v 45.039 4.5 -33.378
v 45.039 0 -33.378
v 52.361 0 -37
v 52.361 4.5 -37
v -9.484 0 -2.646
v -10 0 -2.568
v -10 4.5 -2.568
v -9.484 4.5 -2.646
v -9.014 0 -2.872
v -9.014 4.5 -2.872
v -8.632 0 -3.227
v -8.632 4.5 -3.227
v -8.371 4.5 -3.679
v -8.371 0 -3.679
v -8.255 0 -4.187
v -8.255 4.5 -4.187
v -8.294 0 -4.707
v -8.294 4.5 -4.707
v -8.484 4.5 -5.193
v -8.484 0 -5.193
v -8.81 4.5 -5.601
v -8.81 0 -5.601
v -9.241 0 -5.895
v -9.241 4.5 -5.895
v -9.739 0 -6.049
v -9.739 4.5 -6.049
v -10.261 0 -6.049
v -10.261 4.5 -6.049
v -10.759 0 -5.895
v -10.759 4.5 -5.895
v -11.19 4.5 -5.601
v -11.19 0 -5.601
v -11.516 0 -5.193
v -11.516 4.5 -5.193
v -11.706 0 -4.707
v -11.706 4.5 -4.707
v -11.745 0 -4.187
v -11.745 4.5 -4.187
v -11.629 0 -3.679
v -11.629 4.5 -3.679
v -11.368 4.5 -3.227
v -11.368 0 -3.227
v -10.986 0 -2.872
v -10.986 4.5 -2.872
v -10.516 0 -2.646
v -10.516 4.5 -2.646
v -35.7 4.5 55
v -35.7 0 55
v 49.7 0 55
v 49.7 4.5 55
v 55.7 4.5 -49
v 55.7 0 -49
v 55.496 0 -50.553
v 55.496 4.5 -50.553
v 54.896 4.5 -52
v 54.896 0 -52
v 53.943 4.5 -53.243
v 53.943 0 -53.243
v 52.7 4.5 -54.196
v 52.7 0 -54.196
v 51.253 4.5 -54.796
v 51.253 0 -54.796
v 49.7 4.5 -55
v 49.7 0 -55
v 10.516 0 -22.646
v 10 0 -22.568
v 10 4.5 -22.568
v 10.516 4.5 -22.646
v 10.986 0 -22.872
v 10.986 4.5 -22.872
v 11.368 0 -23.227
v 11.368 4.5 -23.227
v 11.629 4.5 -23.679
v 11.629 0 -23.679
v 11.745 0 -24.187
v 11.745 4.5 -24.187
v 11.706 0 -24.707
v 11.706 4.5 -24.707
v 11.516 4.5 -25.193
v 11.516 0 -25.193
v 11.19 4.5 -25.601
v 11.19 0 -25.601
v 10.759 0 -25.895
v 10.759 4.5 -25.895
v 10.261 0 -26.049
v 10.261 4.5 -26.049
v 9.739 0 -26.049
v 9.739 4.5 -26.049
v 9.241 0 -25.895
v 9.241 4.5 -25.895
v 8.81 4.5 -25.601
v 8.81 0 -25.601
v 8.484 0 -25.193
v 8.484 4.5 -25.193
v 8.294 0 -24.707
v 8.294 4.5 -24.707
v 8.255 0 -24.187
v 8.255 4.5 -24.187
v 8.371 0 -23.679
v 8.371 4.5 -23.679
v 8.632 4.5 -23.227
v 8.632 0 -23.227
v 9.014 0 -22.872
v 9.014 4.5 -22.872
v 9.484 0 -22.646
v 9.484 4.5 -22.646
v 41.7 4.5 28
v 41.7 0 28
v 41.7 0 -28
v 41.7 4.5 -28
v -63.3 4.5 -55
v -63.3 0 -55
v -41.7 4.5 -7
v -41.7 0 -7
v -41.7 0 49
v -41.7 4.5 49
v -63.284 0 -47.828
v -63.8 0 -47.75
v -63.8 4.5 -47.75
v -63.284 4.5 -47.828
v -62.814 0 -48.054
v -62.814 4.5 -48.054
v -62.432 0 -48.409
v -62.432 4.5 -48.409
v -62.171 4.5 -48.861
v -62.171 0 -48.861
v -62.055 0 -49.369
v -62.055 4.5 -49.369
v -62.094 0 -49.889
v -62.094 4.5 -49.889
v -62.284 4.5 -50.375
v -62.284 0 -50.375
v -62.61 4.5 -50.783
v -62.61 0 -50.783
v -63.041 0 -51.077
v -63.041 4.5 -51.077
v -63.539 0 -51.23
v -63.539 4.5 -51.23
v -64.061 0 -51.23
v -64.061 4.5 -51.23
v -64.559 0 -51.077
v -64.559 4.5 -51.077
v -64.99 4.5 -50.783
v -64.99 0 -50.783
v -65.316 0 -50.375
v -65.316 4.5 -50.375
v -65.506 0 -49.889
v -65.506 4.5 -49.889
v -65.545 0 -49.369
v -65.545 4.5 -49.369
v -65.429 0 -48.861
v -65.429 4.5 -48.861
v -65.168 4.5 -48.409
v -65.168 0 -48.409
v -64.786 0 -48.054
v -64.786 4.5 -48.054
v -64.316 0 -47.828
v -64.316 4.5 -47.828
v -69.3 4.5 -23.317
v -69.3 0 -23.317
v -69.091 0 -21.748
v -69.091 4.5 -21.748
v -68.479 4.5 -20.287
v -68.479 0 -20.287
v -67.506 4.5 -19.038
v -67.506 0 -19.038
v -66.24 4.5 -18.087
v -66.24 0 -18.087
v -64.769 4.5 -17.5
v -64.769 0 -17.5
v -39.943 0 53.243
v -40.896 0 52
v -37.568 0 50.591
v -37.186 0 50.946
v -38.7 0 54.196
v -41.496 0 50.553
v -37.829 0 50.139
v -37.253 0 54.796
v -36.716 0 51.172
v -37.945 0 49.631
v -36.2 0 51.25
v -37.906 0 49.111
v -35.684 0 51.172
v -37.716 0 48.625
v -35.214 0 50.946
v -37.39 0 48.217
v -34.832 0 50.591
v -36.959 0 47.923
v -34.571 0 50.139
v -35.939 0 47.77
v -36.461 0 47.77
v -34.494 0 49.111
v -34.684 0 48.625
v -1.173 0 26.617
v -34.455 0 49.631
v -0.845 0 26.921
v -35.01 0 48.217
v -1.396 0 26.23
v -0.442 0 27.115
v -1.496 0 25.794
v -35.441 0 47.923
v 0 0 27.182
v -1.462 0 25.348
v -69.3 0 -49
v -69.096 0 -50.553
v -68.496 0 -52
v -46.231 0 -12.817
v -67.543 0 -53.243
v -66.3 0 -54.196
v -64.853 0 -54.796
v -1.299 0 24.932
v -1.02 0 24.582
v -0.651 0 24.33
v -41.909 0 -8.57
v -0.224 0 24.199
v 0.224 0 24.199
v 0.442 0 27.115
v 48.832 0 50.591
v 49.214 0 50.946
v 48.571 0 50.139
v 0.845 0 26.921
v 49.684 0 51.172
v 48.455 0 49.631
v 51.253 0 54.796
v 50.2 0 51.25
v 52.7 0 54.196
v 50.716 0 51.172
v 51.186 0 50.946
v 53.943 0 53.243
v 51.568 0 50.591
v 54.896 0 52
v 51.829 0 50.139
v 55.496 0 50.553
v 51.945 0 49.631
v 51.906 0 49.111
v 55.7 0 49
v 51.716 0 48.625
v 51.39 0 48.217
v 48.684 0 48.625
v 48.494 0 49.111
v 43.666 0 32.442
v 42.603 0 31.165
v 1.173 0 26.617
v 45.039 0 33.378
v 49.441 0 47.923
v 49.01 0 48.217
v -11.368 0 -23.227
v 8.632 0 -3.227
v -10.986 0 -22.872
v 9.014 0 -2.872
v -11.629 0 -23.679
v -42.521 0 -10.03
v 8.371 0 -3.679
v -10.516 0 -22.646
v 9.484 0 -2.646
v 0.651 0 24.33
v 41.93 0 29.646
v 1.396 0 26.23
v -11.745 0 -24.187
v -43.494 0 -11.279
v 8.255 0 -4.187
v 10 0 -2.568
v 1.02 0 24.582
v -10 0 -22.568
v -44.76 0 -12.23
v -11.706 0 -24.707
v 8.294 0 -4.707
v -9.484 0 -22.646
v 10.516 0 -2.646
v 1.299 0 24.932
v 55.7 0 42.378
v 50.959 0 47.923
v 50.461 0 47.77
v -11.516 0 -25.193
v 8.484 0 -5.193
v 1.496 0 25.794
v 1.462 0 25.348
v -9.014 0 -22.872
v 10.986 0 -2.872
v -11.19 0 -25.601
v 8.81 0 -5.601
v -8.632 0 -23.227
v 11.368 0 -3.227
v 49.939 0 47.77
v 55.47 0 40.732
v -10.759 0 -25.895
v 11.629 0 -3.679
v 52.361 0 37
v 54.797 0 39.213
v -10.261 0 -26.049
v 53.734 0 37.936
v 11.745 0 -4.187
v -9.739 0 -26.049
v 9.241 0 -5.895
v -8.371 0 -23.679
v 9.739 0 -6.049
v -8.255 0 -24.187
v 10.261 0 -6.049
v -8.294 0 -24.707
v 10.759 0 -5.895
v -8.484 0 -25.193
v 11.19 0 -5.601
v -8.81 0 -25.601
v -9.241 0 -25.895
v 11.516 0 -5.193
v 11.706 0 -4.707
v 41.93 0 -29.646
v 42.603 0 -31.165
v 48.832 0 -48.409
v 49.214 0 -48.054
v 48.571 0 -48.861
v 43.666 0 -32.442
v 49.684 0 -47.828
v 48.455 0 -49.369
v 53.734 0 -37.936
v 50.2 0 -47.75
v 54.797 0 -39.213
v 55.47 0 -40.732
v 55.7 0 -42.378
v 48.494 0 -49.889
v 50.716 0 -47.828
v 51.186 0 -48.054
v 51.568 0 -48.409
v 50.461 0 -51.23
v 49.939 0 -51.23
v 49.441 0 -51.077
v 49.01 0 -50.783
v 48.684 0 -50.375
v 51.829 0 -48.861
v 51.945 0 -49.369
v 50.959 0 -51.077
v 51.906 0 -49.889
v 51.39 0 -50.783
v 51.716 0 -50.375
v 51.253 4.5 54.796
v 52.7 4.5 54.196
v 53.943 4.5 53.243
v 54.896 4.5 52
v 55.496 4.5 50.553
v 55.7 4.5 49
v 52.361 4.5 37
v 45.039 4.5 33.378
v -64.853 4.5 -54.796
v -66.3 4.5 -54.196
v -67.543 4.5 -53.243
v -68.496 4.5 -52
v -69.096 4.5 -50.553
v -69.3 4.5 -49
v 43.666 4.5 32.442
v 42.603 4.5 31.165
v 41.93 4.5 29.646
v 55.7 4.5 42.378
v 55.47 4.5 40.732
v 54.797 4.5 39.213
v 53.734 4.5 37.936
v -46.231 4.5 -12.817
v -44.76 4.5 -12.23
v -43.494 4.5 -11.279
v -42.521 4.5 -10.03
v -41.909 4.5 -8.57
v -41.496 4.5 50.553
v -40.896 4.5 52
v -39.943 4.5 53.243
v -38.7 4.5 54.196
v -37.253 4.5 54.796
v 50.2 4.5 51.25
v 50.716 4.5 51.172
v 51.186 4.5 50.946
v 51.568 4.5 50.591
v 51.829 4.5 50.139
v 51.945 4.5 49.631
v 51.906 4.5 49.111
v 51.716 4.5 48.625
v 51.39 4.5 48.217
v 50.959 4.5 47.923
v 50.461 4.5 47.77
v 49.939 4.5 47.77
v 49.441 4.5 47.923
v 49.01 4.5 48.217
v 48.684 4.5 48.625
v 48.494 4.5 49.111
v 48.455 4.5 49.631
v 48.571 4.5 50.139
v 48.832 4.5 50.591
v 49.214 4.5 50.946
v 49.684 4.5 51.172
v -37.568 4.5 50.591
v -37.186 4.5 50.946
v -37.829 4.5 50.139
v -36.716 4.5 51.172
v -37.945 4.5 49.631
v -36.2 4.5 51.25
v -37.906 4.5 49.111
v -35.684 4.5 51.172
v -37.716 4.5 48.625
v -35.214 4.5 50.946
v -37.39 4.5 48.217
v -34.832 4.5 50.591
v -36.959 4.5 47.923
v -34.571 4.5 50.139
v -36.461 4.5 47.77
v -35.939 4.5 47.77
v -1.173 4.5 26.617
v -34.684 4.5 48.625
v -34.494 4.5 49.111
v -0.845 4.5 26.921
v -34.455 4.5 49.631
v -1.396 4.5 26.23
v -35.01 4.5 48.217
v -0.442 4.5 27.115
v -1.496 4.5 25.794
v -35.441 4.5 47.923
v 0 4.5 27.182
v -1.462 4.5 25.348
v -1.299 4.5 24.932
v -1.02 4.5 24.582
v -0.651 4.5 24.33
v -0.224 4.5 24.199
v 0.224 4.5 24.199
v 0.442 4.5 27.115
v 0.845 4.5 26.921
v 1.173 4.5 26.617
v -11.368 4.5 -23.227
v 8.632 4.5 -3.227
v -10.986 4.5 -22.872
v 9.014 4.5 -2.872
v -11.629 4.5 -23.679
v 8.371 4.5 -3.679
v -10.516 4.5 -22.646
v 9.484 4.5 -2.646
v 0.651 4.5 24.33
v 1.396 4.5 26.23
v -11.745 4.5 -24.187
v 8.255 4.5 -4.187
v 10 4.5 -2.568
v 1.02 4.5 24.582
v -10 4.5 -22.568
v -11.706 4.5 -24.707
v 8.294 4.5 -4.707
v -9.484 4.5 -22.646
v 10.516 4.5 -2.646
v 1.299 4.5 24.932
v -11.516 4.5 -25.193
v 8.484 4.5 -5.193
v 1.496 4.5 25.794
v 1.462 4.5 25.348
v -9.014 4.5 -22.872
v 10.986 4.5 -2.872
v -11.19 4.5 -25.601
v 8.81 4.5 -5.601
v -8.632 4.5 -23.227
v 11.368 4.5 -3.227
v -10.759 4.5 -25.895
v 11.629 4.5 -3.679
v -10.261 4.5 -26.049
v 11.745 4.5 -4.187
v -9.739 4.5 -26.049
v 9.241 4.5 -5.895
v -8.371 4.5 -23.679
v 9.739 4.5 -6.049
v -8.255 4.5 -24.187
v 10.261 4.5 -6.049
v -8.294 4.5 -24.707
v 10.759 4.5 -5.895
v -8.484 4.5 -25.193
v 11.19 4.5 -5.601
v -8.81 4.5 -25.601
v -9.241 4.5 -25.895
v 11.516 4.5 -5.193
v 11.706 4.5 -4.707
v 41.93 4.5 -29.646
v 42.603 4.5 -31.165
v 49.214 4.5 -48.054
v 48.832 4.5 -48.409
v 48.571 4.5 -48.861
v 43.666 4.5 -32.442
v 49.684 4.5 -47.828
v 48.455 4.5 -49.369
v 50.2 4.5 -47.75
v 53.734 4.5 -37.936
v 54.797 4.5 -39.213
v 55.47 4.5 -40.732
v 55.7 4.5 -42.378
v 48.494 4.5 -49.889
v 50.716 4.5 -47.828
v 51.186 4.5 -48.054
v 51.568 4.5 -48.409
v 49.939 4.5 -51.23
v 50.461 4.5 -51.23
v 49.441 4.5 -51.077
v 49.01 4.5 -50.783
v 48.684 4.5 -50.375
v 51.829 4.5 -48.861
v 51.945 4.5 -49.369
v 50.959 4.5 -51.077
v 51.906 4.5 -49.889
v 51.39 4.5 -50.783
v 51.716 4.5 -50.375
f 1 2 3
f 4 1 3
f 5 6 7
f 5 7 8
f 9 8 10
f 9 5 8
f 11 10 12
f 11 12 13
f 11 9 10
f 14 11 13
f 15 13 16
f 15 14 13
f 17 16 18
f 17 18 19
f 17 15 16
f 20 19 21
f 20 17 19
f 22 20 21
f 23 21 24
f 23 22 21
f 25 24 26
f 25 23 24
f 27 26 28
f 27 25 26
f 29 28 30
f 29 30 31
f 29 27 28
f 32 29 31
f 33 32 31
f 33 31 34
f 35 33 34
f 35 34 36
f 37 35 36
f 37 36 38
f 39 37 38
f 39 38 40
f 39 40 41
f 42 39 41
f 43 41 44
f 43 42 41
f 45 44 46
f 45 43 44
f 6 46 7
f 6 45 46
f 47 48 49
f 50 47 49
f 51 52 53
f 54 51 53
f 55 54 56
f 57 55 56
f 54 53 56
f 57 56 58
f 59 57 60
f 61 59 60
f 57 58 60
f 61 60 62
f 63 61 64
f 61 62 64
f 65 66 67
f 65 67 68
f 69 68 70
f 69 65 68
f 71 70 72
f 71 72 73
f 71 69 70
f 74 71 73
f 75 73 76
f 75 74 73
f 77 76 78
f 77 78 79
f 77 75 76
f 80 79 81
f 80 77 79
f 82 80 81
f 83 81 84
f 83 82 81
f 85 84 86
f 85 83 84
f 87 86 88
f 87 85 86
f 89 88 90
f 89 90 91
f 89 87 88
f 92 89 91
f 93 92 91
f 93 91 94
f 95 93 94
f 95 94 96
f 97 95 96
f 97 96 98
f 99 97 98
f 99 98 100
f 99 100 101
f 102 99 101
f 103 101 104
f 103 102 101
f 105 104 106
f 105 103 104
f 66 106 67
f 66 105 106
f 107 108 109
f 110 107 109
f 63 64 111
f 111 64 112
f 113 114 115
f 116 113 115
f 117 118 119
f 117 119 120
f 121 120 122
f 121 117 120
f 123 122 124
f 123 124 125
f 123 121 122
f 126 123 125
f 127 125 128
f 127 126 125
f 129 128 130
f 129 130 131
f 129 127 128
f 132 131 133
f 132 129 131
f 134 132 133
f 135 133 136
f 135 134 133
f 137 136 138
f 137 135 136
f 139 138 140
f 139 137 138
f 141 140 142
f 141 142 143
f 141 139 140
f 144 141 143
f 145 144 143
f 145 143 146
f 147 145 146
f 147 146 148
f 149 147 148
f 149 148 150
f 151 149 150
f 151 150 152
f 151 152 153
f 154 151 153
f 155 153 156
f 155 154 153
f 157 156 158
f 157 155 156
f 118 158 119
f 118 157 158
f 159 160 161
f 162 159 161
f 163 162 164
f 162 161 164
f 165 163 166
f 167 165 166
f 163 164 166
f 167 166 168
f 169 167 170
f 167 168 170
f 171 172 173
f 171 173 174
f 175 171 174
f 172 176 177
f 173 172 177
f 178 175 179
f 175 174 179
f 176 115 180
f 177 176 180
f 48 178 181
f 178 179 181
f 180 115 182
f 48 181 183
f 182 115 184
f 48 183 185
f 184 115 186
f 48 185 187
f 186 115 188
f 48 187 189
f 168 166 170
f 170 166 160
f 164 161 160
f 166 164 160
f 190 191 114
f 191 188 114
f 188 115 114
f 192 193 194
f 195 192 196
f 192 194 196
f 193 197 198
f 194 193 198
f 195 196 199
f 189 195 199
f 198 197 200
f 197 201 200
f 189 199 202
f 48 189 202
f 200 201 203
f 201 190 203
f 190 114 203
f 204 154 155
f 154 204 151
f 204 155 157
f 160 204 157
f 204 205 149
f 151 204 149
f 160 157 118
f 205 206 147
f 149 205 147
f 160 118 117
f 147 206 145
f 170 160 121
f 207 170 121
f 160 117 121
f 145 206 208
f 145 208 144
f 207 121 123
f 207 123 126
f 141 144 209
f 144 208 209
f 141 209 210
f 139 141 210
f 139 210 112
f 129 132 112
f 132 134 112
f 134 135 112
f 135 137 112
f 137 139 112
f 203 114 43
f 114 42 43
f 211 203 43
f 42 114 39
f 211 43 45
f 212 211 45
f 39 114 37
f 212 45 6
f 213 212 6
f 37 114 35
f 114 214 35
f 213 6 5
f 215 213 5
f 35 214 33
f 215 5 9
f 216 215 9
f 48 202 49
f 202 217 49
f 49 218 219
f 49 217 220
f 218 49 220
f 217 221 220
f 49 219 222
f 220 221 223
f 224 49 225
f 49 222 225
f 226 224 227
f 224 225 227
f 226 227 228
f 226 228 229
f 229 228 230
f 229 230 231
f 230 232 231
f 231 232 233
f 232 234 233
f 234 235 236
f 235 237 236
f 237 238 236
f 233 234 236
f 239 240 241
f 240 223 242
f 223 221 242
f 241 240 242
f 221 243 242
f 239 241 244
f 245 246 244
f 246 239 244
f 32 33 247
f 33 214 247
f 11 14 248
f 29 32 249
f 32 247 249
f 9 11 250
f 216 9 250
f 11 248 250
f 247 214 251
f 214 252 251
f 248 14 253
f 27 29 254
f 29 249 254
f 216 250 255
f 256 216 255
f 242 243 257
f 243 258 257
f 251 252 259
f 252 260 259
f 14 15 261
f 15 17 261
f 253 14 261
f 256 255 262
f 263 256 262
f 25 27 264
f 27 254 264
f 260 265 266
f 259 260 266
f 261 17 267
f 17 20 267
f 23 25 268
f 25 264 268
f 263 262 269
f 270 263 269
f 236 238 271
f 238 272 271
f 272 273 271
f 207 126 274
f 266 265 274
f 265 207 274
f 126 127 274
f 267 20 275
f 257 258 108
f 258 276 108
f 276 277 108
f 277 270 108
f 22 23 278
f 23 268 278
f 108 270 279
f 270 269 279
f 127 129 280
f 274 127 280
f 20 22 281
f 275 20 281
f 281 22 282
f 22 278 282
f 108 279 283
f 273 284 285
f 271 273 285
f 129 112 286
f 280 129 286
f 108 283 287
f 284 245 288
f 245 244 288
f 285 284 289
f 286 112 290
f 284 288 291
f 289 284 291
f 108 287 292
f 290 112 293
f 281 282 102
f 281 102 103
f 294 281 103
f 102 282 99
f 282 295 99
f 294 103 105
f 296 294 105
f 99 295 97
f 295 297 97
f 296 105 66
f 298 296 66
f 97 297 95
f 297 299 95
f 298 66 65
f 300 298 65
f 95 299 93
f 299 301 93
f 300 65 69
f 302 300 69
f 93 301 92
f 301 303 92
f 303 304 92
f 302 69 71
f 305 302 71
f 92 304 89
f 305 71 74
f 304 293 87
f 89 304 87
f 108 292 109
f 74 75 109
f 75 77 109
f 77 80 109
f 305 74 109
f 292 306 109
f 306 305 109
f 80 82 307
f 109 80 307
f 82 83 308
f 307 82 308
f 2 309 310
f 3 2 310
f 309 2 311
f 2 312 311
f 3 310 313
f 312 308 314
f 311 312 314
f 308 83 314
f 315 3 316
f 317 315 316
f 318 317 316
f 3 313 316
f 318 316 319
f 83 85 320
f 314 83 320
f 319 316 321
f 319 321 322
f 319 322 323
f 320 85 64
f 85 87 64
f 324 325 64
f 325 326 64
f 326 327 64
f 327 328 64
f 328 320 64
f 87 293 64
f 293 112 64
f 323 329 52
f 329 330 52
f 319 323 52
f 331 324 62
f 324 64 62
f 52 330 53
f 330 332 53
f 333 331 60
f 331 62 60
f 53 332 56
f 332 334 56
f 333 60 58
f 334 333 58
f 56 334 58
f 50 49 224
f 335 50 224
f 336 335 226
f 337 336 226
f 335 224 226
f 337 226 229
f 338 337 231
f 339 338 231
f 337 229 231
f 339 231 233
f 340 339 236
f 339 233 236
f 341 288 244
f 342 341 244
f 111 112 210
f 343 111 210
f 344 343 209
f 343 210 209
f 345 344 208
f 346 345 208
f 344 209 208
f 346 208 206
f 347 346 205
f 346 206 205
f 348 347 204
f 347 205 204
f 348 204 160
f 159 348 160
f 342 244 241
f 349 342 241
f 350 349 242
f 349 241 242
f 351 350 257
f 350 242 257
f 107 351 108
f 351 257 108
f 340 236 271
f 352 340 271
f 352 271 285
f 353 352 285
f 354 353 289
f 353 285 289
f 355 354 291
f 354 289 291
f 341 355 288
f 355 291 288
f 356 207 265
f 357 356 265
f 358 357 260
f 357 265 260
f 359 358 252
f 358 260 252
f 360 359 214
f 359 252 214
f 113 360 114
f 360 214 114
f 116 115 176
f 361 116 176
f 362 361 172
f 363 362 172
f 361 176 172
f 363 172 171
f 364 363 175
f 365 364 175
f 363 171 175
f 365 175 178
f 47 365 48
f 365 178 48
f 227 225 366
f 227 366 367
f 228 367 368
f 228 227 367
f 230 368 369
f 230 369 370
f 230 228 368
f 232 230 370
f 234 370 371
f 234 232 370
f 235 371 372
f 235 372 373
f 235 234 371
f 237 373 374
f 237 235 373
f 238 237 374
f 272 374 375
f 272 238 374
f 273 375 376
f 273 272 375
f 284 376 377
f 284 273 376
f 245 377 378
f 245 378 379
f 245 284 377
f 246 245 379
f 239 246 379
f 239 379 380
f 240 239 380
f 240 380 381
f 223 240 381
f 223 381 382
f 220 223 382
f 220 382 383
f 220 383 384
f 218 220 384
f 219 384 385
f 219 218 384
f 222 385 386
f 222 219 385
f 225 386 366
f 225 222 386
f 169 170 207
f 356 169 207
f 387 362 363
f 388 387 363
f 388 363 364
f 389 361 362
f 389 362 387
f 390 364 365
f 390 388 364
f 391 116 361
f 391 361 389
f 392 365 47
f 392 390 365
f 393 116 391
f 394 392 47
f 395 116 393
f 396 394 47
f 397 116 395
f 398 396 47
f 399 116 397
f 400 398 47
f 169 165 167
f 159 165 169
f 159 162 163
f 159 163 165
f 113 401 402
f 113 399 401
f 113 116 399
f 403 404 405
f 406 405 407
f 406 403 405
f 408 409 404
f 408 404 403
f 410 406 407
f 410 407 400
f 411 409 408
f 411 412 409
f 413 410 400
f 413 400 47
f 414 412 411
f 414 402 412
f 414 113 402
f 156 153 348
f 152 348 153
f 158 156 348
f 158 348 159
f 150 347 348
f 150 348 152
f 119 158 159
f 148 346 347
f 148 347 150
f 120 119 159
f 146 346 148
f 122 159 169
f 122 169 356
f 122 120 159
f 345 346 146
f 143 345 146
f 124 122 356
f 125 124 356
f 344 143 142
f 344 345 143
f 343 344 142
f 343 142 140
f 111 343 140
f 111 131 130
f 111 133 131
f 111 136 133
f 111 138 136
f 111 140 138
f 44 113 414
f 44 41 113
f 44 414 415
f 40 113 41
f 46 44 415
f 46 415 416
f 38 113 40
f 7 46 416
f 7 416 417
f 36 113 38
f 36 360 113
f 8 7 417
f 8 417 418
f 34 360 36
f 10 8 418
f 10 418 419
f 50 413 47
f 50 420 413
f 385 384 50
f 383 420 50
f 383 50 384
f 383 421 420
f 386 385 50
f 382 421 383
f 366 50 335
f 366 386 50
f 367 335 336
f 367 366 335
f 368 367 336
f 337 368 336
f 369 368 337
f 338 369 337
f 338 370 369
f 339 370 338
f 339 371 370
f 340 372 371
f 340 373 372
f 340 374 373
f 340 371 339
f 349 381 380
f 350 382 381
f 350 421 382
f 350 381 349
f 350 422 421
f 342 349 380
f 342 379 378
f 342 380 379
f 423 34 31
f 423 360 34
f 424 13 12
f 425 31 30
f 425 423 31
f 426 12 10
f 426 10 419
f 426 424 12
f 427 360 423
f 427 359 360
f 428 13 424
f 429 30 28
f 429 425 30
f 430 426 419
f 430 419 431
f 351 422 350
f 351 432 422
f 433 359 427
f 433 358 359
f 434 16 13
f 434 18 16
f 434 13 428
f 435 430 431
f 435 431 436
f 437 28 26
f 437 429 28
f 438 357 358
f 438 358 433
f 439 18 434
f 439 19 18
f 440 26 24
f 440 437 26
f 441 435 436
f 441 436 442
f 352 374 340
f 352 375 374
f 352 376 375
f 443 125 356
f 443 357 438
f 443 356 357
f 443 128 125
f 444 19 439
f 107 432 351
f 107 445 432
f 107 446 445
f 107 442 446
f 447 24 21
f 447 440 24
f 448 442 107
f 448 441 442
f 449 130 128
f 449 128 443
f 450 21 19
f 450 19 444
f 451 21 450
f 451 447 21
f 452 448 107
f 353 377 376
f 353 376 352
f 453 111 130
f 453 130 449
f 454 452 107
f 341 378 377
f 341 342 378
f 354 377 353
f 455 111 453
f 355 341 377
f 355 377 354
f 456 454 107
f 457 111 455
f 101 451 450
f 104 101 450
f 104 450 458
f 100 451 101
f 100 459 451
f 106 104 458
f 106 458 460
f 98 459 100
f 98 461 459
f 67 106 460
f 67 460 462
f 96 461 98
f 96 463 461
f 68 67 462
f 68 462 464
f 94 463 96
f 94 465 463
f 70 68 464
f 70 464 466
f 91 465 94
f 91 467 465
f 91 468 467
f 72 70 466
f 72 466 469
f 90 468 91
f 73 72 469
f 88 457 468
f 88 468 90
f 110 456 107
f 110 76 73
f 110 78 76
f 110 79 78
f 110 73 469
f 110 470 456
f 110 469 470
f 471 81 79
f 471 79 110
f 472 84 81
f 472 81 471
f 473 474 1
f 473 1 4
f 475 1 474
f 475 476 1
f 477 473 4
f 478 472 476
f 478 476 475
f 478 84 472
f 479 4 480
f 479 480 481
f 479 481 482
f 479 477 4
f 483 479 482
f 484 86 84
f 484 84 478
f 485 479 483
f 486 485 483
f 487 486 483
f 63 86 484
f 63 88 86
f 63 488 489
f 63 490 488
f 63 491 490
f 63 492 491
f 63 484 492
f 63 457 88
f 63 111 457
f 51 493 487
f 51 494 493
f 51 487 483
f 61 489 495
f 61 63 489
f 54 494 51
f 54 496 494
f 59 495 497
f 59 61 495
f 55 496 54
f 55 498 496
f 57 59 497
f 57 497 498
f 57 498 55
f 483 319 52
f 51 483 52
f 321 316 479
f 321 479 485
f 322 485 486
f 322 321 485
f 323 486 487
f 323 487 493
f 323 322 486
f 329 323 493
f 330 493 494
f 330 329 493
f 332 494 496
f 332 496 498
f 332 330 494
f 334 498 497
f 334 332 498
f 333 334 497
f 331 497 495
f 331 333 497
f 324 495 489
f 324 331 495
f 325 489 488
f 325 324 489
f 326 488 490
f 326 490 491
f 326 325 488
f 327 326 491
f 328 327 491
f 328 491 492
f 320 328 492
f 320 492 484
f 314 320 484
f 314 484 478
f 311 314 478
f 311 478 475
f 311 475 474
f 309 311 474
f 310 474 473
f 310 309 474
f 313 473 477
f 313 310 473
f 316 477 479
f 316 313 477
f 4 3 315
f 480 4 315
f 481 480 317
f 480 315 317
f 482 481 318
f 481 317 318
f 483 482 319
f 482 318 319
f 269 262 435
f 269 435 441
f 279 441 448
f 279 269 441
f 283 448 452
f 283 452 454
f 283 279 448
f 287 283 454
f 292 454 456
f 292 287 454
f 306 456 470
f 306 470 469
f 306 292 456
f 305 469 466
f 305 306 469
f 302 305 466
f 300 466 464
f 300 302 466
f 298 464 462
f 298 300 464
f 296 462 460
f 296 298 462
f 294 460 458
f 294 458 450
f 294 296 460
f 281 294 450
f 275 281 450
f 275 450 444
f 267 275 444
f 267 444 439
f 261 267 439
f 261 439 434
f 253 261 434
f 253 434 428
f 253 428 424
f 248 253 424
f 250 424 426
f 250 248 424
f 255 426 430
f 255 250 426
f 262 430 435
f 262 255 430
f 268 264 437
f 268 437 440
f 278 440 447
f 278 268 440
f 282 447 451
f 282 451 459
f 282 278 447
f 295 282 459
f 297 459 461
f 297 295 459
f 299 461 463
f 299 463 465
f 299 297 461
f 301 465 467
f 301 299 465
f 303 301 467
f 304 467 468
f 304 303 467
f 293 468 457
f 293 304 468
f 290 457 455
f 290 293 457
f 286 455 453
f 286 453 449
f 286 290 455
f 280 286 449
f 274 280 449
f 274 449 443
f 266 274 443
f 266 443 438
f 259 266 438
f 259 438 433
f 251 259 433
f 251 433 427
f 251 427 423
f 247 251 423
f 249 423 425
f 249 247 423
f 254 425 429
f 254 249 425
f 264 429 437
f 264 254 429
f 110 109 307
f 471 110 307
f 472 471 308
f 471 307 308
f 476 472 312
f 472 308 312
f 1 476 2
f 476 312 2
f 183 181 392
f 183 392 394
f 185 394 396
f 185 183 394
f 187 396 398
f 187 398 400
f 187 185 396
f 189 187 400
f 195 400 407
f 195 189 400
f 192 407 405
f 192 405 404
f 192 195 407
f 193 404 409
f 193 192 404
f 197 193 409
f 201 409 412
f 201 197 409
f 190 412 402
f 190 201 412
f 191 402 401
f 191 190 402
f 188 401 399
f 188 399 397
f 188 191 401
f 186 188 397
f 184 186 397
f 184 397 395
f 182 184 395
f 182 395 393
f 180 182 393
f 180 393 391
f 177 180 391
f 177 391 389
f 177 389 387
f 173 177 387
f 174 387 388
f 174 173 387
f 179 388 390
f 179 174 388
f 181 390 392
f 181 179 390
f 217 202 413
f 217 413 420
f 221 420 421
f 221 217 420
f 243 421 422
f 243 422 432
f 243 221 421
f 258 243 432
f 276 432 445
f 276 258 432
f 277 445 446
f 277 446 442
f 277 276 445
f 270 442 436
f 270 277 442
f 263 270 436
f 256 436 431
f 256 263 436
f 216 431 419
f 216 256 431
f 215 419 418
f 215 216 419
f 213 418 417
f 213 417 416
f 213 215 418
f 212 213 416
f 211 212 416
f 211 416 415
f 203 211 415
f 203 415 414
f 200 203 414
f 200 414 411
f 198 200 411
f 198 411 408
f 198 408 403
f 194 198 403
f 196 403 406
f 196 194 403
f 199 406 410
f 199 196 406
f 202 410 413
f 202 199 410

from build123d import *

# Parameters (mm, degrees)
SKETCH1_R           = 1.75
SKETCH1_R_2         = 1.5
BOSS_EXTRUDE1_DEPTH = 4.5


with BuildPart() as part:
    # Sketch1 → Boss-Extrude1 (new body)
    with BuildSketch(Plane(origin=(0, 0, 0), x_dir=(1, 0, 0), z_dir=(0, 1, 0))):
        with BuildLine():
            Line((-35.7, -55), (49.7, -55))
            ThreePointArc((49.7, -55), (53.942640687, -53.242640687), (55.7, -49))
            Line((55.7, -49), (55.7, -42.377818725))
            ThreePointArc((55.7, -42.377818725), (54.797249664, -39.212689049), (52.36065138, -37))
            Line((52.36065138, -37), (45.03934862, -33.377818725))
            ThreePointArc((45.03934862, -33.377818725), (42.602750336, -31.165129675), (41.7, -28))
            Line((41.7, -28), (41.7, 28))
            ThreePointArc((41.7, 28), (42.602750336, 31.165129675), (45.03934862, 33.377818725))
            Line((45.03934862, 33.377818725), (52.36065138, 37))
            ThreePointArc((52.36065138, 37), (54.797249664, 39.212689049), (55.7, 42.377818725))
            Line((55.7, 42.377818725), (55.7, 49))
            ThreePointArc((55.7, 49), (53.942640687, 53.242640687), (49.7, 55))
            Line((49.7, 55), (-63.3, 55))
            ThreePointArc((-63.3, 55), (-67.542640687, 53.242640687), (-69.3, 49))
            Line((-69.3, 49), (-69.3, 23.31729281))
            ThreePointArc((-69.3, 23.31729281), (-68.03372658, 19.630582533), (-64.769389112, 17.5))
            Line((-64.769389112, 17.5), (-46.230610888, 12.81729281))
            ThreePointArc((-46.230610888, 12.81729281), (-42.96627342, 10.686710277), (-41.7, 7))
            Line((-41.7, 7), (-41.7, -49))
            ThreePointArc((-41.7, -49), (-39.942640687, -53.242640687), (-35.7, -55))
        make_face()
        with Locations(Location((-63.8, 49.5, 0), (0, 0, 270))):
            Circle(SKETCH1_R, mode=Mode.SUBTRACT)
        with Locations(Location((-36.2, -49.5, 0), (0, 0, 270))):
            Circle(SKETCH1_R, mode=Mode.SUBTRACT)
        with Locations(Location((50.2, -49.5, 0), (0, 0, 270))):
            Circle(SKETCH1_R, mode=Mode.SUBTRACT)
        with Locations(Location((50.2, 49.5, 0), (0, 0, 270))):
            Circle(SKETCH1_R, mode=Mode.SUBTRACT)
        with Locations(Location((-10, 24.318057397, 0), (0, 0, 270))):
            Circle(SKETCH1_R, mode=Mode.SUBTRACT)
        with Locations(Location((-10, 4.318057397, 0), (0, 0, 270))):
            Circle(SKETCH1_R, mode=Mode.SUBTRACT)
        with Locations(Location((10, 4.318057397, 0), (0, 0, 270))):
            Circle(SKETCH1_R, mode=Mode.SUBTRACT)
        with Locations(Location((10, 24.318057397, 0), (0, 0, 270))):
            Circle(SKETCH1_R, mode=Mode.SUBTRACT)
        with Locations(Location((0, -25.681942603, 0), (0, 0, 270))):
            Circle(SKETCH1_R_2, mode=Mode.SUBTRACT)
    extrude(amount=BOSS_EXTRUDE1_DEPTH)


solid = part.part
